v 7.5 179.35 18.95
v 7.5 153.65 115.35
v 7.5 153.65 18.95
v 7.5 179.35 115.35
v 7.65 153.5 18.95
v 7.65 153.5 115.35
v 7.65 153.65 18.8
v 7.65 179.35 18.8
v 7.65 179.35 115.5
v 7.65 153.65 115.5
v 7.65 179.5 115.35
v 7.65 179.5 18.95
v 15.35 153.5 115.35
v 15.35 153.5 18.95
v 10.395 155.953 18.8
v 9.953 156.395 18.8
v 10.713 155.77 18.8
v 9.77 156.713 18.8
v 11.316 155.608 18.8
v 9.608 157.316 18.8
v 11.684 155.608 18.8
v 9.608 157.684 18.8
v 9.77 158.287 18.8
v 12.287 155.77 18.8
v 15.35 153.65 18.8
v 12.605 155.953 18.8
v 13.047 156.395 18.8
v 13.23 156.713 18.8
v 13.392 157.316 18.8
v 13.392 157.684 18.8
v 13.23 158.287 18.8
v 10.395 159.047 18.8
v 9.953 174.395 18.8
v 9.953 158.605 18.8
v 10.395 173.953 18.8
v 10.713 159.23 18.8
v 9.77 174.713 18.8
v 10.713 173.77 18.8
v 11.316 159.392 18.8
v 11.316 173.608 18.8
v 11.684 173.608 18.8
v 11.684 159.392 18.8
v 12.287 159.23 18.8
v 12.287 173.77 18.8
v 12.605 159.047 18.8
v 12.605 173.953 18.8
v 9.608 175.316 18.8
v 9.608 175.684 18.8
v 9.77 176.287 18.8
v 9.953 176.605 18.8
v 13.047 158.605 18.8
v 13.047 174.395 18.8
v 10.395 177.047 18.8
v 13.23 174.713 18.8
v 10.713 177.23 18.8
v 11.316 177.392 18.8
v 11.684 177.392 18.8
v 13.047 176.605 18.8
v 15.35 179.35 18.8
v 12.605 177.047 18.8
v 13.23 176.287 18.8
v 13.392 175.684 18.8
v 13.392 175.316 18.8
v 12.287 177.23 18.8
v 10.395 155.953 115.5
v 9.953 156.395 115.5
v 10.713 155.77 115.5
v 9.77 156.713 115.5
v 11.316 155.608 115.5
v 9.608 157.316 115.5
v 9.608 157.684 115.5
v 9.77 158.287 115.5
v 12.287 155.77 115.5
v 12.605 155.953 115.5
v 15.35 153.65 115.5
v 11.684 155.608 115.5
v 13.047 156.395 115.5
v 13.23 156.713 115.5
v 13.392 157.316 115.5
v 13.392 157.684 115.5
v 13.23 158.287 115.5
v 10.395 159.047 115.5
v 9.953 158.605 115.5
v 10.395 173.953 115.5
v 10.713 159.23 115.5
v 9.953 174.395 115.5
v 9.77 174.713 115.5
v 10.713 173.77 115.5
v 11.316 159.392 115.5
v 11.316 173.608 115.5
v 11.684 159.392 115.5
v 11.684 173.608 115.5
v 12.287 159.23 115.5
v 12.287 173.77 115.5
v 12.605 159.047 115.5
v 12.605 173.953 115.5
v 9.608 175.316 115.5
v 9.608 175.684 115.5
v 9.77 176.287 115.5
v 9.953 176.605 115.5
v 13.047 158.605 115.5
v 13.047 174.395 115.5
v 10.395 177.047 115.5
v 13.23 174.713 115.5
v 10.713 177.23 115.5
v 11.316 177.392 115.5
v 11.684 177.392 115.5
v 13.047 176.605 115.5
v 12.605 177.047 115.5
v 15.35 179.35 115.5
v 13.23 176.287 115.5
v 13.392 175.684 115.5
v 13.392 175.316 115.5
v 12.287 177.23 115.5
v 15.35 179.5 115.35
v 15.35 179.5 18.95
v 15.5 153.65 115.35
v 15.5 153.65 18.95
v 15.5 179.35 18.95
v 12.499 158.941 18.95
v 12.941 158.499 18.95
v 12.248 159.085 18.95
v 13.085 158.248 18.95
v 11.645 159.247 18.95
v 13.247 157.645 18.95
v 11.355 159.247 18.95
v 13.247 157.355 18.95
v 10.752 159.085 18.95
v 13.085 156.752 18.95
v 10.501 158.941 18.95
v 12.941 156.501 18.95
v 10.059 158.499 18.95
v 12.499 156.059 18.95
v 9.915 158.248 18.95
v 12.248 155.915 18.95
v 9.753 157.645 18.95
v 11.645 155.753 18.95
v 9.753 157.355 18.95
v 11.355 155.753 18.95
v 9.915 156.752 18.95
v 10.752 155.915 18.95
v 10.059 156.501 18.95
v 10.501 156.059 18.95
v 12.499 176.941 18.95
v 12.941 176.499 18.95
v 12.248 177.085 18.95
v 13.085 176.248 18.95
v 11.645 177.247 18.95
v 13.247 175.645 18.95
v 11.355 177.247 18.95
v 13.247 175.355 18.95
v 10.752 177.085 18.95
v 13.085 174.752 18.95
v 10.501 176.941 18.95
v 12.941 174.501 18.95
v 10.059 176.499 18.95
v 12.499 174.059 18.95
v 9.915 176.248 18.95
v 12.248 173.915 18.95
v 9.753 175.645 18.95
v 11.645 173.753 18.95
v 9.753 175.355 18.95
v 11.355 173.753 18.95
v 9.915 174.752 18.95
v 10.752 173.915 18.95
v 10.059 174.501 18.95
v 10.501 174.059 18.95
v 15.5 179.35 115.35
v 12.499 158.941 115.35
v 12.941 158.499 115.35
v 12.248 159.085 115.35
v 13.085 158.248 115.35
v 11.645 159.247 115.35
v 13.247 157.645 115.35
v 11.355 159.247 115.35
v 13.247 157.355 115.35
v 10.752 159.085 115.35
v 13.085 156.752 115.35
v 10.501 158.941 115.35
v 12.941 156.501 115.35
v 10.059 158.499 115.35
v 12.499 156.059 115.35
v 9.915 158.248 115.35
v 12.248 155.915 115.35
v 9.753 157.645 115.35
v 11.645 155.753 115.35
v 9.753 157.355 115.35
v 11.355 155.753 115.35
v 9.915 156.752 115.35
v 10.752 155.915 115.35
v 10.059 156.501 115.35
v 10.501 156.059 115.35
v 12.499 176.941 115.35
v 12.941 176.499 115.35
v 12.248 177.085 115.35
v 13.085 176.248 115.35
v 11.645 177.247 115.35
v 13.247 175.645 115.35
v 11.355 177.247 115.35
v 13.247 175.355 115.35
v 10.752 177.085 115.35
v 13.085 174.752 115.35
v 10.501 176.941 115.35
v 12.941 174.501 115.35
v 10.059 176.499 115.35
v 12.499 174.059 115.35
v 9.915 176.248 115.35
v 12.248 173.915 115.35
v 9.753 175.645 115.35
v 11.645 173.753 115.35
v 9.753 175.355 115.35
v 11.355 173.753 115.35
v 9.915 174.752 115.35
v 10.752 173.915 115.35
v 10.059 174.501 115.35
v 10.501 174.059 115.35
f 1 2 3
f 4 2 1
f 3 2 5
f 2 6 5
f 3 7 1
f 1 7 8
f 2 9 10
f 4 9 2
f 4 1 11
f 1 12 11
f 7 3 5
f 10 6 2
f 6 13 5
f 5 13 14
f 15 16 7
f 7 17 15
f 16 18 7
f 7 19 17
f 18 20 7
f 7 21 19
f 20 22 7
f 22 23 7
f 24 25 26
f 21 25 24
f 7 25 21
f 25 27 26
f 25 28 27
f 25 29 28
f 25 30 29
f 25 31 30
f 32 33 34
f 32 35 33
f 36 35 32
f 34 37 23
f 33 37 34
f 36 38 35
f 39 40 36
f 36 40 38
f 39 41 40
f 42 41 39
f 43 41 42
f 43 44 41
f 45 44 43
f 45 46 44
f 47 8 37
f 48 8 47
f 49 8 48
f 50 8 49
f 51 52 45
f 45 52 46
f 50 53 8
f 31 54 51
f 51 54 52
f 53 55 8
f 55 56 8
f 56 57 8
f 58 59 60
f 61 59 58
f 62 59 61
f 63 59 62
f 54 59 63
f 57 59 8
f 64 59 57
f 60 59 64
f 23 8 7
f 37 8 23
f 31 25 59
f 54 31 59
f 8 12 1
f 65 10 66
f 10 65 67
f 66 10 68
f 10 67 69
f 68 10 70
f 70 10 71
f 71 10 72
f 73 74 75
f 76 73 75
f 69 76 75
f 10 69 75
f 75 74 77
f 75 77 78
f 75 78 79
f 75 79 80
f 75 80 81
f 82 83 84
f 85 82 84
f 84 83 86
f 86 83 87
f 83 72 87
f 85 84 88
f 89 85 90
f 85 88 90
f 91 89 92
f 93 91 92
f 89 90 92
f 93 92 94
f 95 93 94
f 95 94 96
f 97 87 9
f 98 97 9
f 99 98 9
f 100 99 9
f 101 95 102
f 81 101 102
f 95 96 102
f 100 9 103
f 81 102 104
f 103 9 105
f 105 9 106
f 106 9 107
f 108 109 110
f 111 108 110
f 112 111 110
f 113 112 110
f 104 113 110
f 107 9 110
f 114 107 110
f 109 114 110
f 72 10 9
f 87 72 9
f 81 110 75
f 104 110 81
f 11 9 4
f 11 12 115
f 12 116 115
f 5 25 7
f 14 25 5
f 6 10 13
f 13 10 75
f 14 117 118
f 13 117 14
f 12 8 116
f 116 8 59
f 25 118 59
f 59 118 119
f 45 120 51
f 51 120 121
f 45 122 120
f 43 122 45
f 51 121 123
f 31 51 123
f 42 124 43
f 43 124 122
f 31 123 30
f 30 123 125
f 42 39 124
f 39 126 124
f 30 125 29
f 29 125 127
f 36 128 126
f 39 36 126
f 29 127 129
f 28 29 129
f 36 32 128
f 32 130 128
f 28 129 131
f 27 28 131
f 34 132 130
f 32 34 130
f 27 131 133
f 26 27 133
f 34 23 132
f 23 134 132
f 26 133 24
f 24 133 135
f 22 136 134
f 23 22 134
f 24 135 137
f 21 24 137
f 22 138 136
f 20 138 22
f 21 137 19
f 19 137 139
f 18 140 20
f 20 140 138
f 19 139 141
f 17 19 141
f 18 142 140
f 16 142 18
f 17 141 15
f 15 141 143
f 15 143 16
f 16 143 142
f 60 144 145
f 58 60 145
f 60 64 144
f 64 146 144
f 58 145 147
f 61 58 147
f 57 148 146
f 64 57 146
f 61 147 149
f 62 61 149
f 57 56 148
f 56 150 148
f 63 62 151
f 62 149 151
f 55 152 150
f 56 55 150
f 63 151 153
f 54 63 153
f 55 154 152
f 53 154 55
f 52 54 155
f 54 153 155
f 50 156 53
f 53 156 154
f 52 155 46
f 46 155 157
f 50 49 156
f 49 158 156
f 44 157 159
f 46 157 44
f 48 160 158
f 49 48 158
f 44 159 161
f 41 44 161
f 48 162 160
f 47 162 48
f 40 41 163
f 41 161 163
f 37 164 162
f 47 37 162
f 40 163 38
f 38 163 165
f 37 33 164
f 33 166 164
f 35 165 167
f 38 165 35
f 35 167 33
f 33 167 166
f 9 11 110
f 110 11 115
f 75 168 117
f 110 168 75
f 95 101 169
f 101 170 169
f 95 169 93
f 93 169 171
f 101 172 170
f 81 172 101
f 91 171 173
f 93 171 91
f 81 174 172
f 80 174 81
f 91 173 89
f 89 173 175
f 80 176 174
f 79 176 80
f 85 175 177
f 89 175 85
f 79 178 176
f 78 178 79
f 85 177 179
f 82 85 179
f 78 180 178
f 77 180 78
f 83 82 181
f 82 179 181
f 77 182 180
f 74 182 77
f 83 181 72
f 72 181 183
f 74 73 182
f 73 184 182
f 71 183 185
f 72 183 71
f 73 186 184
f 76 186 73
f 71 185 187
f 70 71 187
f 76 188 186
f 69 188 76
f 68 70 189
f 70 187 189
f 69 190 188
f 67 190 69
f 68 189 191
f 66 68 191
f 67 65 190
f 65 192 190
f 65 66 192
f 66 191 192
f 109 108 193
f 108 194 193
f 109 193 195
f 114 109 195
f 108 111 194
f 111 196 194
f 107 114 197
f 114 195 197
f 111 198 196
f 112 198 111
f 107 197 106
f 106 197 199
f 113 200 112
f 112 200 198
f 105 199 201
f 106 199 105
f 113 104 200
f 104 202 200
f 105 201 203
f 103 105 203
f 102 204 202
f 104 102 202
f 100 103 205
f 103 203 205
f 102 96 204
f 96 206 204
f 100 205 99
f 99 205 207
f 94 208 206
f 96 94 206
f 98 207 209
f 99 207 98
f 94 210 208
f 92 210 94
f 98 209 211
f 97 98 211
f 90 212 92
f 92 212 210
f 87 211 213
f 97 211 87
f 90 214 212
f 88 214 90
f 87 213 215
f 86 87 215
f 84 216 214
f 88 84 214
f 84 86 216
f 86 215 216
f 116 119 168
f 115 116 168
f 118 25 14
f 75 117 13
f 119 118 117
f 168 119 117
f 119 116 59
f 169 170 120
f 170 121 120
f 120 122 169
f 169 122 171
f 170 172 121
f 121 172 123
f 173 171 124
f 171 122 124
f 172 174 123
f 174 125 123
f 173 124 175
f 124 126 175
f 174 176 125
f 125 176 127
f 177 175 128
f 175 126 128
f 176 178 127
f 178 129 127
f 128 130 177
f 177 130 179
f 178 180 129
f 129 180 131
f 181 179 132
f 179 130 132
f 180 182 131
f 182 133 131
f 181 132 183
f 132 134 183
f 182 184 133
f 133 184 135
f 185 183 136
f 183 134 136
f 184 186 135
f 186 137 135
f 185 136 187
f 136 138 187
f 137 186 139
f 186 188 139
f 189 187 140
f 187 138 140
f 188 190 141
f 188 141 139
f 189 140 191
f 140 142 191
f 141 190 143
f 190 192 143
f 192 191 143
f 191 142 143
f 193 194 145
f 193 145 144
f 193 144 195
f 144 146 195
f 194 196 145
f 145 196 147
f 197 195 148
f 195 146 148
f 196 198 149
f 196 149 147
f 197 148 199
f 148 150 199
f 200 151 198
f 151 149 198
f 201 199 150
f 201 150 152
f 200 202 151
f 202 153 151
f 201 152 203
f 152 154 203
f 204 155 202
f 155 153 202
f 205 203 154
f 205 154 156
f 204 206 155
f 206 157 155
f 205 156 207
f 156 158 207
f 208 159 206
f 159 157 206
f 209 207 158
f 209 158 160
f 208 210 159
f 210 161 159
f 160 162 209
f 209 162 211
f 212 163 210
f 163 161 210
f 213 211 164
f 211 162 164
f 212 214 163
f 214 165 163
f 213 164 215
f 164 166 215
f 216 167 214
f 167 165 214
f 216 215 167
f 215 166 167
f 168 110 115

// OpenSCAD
// Generated from the same CSG operations as STEP. Rebuild with spec/build_parent_hand_service.py.
polyhedron(points=[[7.5, 153.64999389648438, 18.950000762939453], [7.5, 153.64999389648438, 115.3499984741211], [7.5, 179.35000610351562, 18.950000762939453], [7.5, 179.35000610351562, 115.3499984741211], [7.650000095367432, 153.5, 18.950000762939453], [7.650000095367432, 153.5, 115.3499984741211], [7.650000095367432, 153.64999389648438, 18.799999237060547], [7.650000095367432, 179.35000610351562, 18.799999237060547], [7.650000095367432, 153.64999389648438, 115.5], [7.650000095367432, 179.35000610351562, 115.5], [7.650000095367432, 179.5, 115.3499984741211], [7.650000095367432, 179.5, 18.950000762939453], [15.350000381469727, 153.5, 115.3499984741211], [15.350000381469727, 153.5, 18.950000762939453], [9.953407287597656, 156.3949432373047, 18.799999237060547], [10.394942283630371, 155.9534149169922, 18.799999237060547], [10.713140487670898, 155.7696990966797, 18.799999237060547], [9.769695281982422, 156.713134765625, 18.799999237060547], [11.316287994384766, 155.6080780029297, 18.799999237060547], [9.60808277130127, 157.3162841796875, 18.799999237060547], [11.683712005615234, 155.6080780029297, 18.799999237060547], [9.60808277130127, 157.6837158203125, 18.799999237060547], [9.769695281982422, 158.286865234375, 18.799999237060547], [12.605057716369629, 155.9534149169922, 18.799999237060547], [15.350000381469727, 153.64999389648438, 18.799999237060547], [12.286859512329102, 155.7696990966797, 18.799999237060547], [13.046592712402344, 156.3949432373047, 18.799999237060547], [13.230304718017578, 156.713134765625, 18.799999237060547], [13.39191722869873, 157.3162841796875, 18.799999237060547], [13.39191722869873, 157.6837158203125, 18.799999237060547], [13.230304718017578, 158.286865234375, 18.799999237060547], [9.953407287597656, 158.6050567626953, 18.799999237060547], [9.953407287597656, 174.3949432373047, 18.799999237060547], [10.394942283630371, 159.0465850830078, 18.799999237060547], [10.394942283630371, 173.9534149169922, 18.799999237060547], [10.713140487670898, 159.2303009033203, 18.799999237060547], [9.769695281982422, 174.713134765625, 18.799999237060547], [10.713140487670898, 173.7696990966797, 18.799999237060547], [11.316287994384766, 173.6080780029297, 18.799999237060547], [11.316287994384766, 159.3919219970703, 18.799999237060547], [11.683712005615234, 173.6080780029297, 18.799999237060547], [11.683712005615234, 159.3919219970703, 18.799999237060547], [12.286859512329102, 159.2303009033203, 18.799999237060547], [12.286859512329102, 173.7696990966797, 18.799999237060547], [12.605057716369629, 159.0465850830078, 18.799999237060547], [12.605057716369629, 173.9534149169922, 18.799999237060547], [9.60808277130127, 175.3162841796875, 18.799999237060547], [9.60808277130127, 175.6837158203125, 18.799999237060547], [9.769695281982422, 176.286865234375, 18.799999237060547], [9.953407287597656, 176.6050567626953, 18.799999237060547], [13.046592712402344, 174.3949432373047, 18.799999237060547], [13.046592712402344, 158.6050567626953, 18.799999237060547], [10.394942283630371, 177.0465850830078, 18.799999237060547], [13.230304718017578, 174.713134765625, 18.799999237060547], [10.713140487670898, 177.2303009033203, 18.799999237060547], [11.316287994384766, 177.3919219970703, 18.799999237060547], [11.683712005615234, 177.3919219970703, 18.799999237060547], [12.605057716369629, 177.0465850830078, 18.799999237060547], [15.350000381469727, 179.35000610351562, 18.799999237060547], [13.046592712402344, 176.6050567626953, 18.799999237060547], [13.230304718017578, 176.286865234375, 18.799999237060547], [13.39191722869873, 175.6837158203125, 18.799999237060547], [13.39191722869873, 175.3162841796875, 18.799999237060547], [12.286859512329102, 177.2303009033203, 18.799999237060547], [9.953407287597656, 156.3949432373047, 115.5], [10.394942283630371, 155.9534149169922, 115.5], [10.713140487670898, 155.7696990966797, 115.5], [9.769695281982422, 156.713134765625, 115.5], [11.316287994384766, 155.6080780029297, 115.5], [9.60808277130127, 157.3162841796875, 115.5], [9.60808277130127, 157.6837158203125, 115.5], [9.769695281982422, 158.286865234375, 115.5], [15.350000381469727, 153.64999389648438, 115.5], [12.605057716369629, 155.9534149169922, 115.5], [12.286859512329102, 155.7696990966797, 115.5], [11.683712005615234, 155.6080780029297, 115.5], [13.046592712402344, 156.3949432373047, 115.5], [13.230304718017578, 156.713134765625, 115.5], [13.39191722869873, 157.3162841796875, 115.5], [13.39191722869873, 157.6837158203125, 115.5], [13.230304718017578, 158.286865234375, 115.5], [10.394942283630371, 173.9534149169922, 115.5], [9.953407287597656, 158.6050567626953, 115.5], [10.394942283630371, 159.0465850830078, 115.5], [10.713140487670898, 159.2303009033203, 115.5], [9.953407287597656, 174.3949432373047, 115.5], [9.769695281982422, 174.713134765625, 115.5], [10.713140487670898, 173.7696990966797, 115.5], [11.316287994384766, 173.6080780029297, 115.5], [11.316287994384766, 159.3919219970703, 115.5], [11.683712005615234, 173.6080780029297, 115.5], [11.683712005615234, 159.3919219970703, 115.5], [12.286859512329102, 159.2303009033203, 115.5], [12.286859512329102, 173.7696990966797, 115.5], [12.605057716369629, 159.0465850830078, 115.5], [12.605057716369629, 173.9534149169922, 115.5], [9.60808277130127, 175.3162841796875, 115.5], [9.60808277130127, 175.6837158203125, 115.5], [9.769695281982422, 176.286865234375, 115.5], [9.953407287597656, 176.6050567626953, 115.5], [13.046592712402344, 174.3949432373047, 115.5], [13.046592712402344, 158.6050567626953, 115.5], [10.394942283630371, 177.0465850830078, 115.5], [13.230304718017578, 174.713134765625, 115.5], [10.713140487670898, 177.2303009033203, 115.5], [11.316287994384766, 177.3919219970703, 115.5], [11.683712005615234, 177.3919219970703, 115.5], [15.350000381469727, 179.35000610351562, 115.5], [12.605057716369629, 177.0465850830078, 115.5], [13.046592712402344, 176.6050567626953, 115.5], [13.230304718017578, 176.286865234375, 115.5], [13.39191722869873, 175.6837158203125, 115.5], [13.39191722869873, 175.3162841796875, 115.5], [12.286859512329102, 177.2303009033203, 115.5], [15.350000381469727, 179.5, 115.3499984741211], [15.350000381469727, 179.5, 18.950000762939453], [15.5, 153.64999389648438, 18.950000762939453], [15.5, 153.64999389648438, 115.3499984741211], [15.5, 179.35000610351562, 18.950000762939453], [12.498991966247559, 158.94052124023438, 18.950000762939453], [12.940526962280273, 158.49899291992188, 18.950000762939453], [12.24803638458252, 159.08541870117188, 18.950000762939453], [13.085415840148926, 158.24803161621094, 18.950000762939453], [11.644888877868652, 159.2470245361328, 18.950000762939453], [13.247028350830078, 157.64488220214844, 18.950000762939453], [11.355111122131348, 159.2470245361328, 18.950000762939453], [13.247028350830078, 157.35511779785156, 18.950000762939453], [10.75196361541748, 159.08541870117188, 18.950000762939453], [13.085415840148926, 156.75196838378906, 18.950000762939453], [10.501008033752441, 158.94052124023438, 18.950000762939453], [12.940526962280273, 156.50100708007812, 18.950000762939453], [10.059473037719727, 158.49899291992188, 18.950000762939453], [12.498991966247559, 156.05947875976562, 18.950000762939453], [9.914584159851074, 158.24803161621094, 18.950000762939453], [12.24803638458252, 155.91458129882812, 18.950000762939453], [9.752971649169922, 157.64488220214844, 18.950000762939453], [11.644888877868652, 155.7529754638672, 18.950000762939453], [9.752971649169922, 157.35511779785156, 18.950000762939453], [11.355111122131348, 155.7529754638672, 18.950000762939453], [9.914584159851074, 156.75196838378906, 18.950000762939453], [10.75196361541748, 155.91458129882812, 18.950000762939453], [10.059473037719727, 156.50100708007812, 18.950000762939453], [10.501008033752441, 156.05947875976562, 18.950000762939453], [12.940526962280273, 176.49899291992188, 18.950000762939453], [12.498991966247559, 176.94052124023438, 18.950000762939453], [12.24803638458252, 177.08541870117188, 18.950000762939453], [13.085415840148926, 176.24803161621094, 18.950000762939453], [11.644888877868652, 177.2470245361328, 18.950000762939453], [13.247028350830078, 175.64488220214844, 18.950000762939453], [11.355111122131348, 177.2470245361328, 18.950000762939453], [13.247028350830078, 175.35511779785156, 18.950000762939453], [10.75196361541748, 177.08541870117188, 18.950000762939453], [13.085415840148926, 174.75196838378906, 18.950000762939453], [10.501008033752441, 176.94052124023438, 18.950000762939453], [12.940526962280273, 174.50100708007812, 18.950000762939453], [10.059473037719727, 176.49899291992188, 18.950000762939453], [12.498991966247559, 174.05947875976562, 18.950000762939453], [9.914584159851074, 176.24803161621094, 18.950000762939453], [12.24803638458252, 173.91458129882812, 18.950000762939453], [9.752971649169922, 175.64488220214844, 18.950000762939453], [11.644888877868652, 173.7529754638672, 18.950000762939453], [9.752971649169922, 175.35511779785156, 18.950000762939453], [11.355111122131348, 173.7529754638672, 18.950000762939453], [9.914584159851074, 174.75196838378906, 18.950000762939453], [10.75196361541748, 173.91458129882812, 18.950000762939453], [10.059473037719727, 174.50100708007812, 18.950000762939453], [10.501008033752441, 174.05947875976562, 18.950000762939453], [15.5, 179.35000610351562, 115.3499984741211], [12.498991966247559, 158.94052124023438, 115.3499984741211], [12.940526962280273, 158.49899291992188, 115.3499984741211], [12.24803638458252, 159.08541870117188, 115.3499984741211], [13.085415840148926, 158.24803161621094, 115.3499984741211], [11.644888877868652, 159.2470245361328, 115.3499984741211], [13.247028350830078, 157.64488220214844, 115.3499984741211], [11.355111122131348, 159.2470245361328, 115.3499984741211], [13.247028350830078, 157.35511779785156, 115.3499984741211], [10.75196361541748, 159.08541870117188, 115.3499984741211], [13.085415840148926, 156.75196838378906, 115.3499984741211], [10.501008033752441, 158.94052124023438, 115.3499984741211], [12.940526962280273, 156.50100708007812, 115.3499984741211], [10.059473037719727, 158.49899291992188, 115.3499984741211], [12.498991966247559, 156.05947875976562, 115.3499984741211], [9.914584159851074, 158.24803161621094, 115.3499984741211], [12.24803638458252, 155.91458129882812, 115.3499984741211], [9.752971649169922, 157.64488220214844, 115.3499984741211], [11.644888877868652, 155.7529754638672, 115.3499984741211], [9.752971649169922, 157.35511779785156, 115.3499984741211], [11.355111122131348, 155.7529754638672, 115.3499984741211], [9.914584159851074, 156.75196838378906, 115.3499984741211], [10.75196361541748, 155.91458129882812, 115.3499984741211], [10.059473037719727, 156.50100708007812, 115.3499984741211], [10.501008033752441, 156.05947875976562, 115.3499984741211], [12.498991966247559, 176.94052124023438, 115.3499984741211], [12.940526962280273, 176.49899291992188, 115.3499984741211], [12.24803638458252, 177.08541870117188, 115.3499984741211], [13.085415840148926, 176.24803161621094, 115.3499984741211], [11.644888877868652, 177.2470245361328, 115.3499984741211], [13.247028350830078, 175.64488220214844, 115.3499984741211], [11.355111122131348, 177.2470245361328, 115.3499984741211], [13.247028350830078, 175.35511779785156, 115.3499984741211], [10.75196361541748, 177.08541870117188, 115.3499984741211], [13.085415840148926, 174.75196838378906, 115.3499984741211], [10.501008033752441, 176.94052124023438, 115.3499984741211], [12.940526962280273, 174.50100708007812, 115.3499984741211], [10.059473037719727, 176.49899291992188, 115.3499984741211], [12.498991966247559, 174.05947875976562, 115.3499984741211], [9.914584159851074, 176.24803161621094, 115.3499984741211], [12.24803638458252, 173.91458129882812, 115.3499984741211], [9.752971649169922, 175.64488220214844, 115.3499984741211], [11.644888877868652, 173.7529754638672, 115.3499984741211], [9.752971649169922, 175.35511779785156, 115.3499984741211], [11.355111122131348, 173.7529754638672, 115.3499984741211], [9.914584159851074, 174.75196838378906, 115.3499984741211], [10.75196361541748, 173.91458129882812, 115.3499984741211], [10.059473037719727, 174.50100708007812, 115.3499984741211], [10.501008033752441, 174.05947875976562, 115.3499984741211]],faces=[[0, 1, 2], [2, 1, 3], [4, 1, 0], [4, 5, 1], [2, 6, 0], [7, 6, 2], [8, 9, 1], [1, 9, 3], [10, 2, 3], [10, 11, 2], [4, 0, 6], [1, 5, 8], [4, 12, 5], [13, 12, 4], [6, 14, 15], [15, 16, 6], [6, 17, 14], [16, 18, 6], [6, 19, 17], [18, 20, 6], [6, 21, 19], [6, 22, 21], [23, 24, 25], [25, 24, 20], [20, 24, 6], [23, 26, 24], [26, 27, 24], [27, 28, 24], [28, 29, 24], [29, 30, 24], [31, 32, 33], [32, 34, 33], [33, 34, 35], [22, 36, 31], [31, 36, 32], [34, 37, 35], [35, 38, 39], [37, 38, 35], [38, 40, 39], [39, 40, 41], [41, 40, 42], [40, 43, 42], [42, 43, 44], [43, 45, 44], [36, 7, 46], [46, 7, 47], [47, 7, 48], [48, 7, 49], [44, 50, 51], [45, 50, 44], [7, 52, 49], [51, 53, 30], [50, 53, 51], [7, 54, 52], [7, 55, 54], [7, 56, 55], [57, 58, 59], [59, 58, 60], [60, 58, 61], [61, 58, 62], [62, 58, 53], [7, 58, 56], [56, 58, 63], [63, 58, 57], [6, 7, 22], [22, 7, 36], [58, 24, 30], [58, 30, 53], [2, 11, 7], [64, 8, 65], [66, 65, 8], [67, 8, 64], [68, 66, 8], [69, 8, 67], [70, 8, 69], [71, 8, 70], [72, 73, 74], [72, 74, 75], [72, 75, 68], [72, 68, 8], [76, 73, 72], [77, 76, 72], [78, 77, 72], [79, 78, 72], [80, 79, 72], [81, 82, 83], [81, 83, 84], [85, 82, 81], [86, 82, 85], [86, 71, 82], [87, 81, 84], [88, 84, 89], [88, 87, 84], [90, 89, 91], [90, 91, 92], [90, 88, 89], [93, 90, 92], [93, 92, 94], [95, 93, 94], [9, 86, 96], [9, 96, 97], [9, 97, 98], [9, 98, 99], [100, 94, 101], [100, 101, 80], [100, 95, 94], [102, 9, 99], [103, 100, 80], [104, 9, 102], [105, 9, 104], [106, 9, 105], [107, 108, 109], [107, 109, 110], [107, 110, 111], [107, 111, 112], [107, 112, 103], [107, 9, 106], [107, 106, 113], [107, 113, 108], [9, 8, 71], [9, 71, 86], [72, 107, 80], [80, 107, 103], [3, 9, 10], [114, 11, 10], [114, 115, 11], [6, 24, 4], [4, 24, 13], [12, 8, 5], [72, 8, 12], [116, 117, 13], [13, 117, 12], [115, 7, 11], [58, 7, 115], [58, 116, 24], [118, 116, 58], [51, 119, 44], [120, 119, 51], [119, 121, 44], [44, 121, 42], [122, 120, 51], [122, 51, 30], [42, 123, 41], [121, 123, 42], [29, 122, 30], [124, 122, 29], [123, 39, 41], [123, 125, 39], [28, 124, 29], [126, 124, 28], [125, 127, 35], [125, 35, 39], [128, 126, 28], [128, 28, 27], [127, 33, 35], [127, 129, 33], [130, 128, 27], [130, 27, 26], [129, 131, 31], [129, 31, 33], [132, 130, 26], [132, 26, 23], [131, 22, 31], [131, 133, 22], [25, 132, 23], [134, 132, 25], [133, 135, 21], [133, 21, 22], [136, 134, 25], [136, 25, 20], [135, 137, 21], [21, 137, 19], [18, 136, 20], [138, 136, 18], [19, 139, 17], [137, 139, 19], [140, 138, 18], [140, 18, 16], [139, 141, 17], [17, 141, 14], [15, 140, 16], [142, 140, 15], [14, 142, 15], [141, 142, 14], [143, 144, 57], [143, 57, 59], [144, 63, 57], [144, 145, 63], [146, 143, 59], [146, 59, 60], [145, 147, 56], [145, 56, 63], [148, 146, 60], [148, 60, 61], [147, 55, 56], [147, 149, 55], [150, 61, 62], [150, 148, 61], [149, 151, 54], [149, 54, 55], [152, 150, 62], [152, 62, 53], [151, 153, 54], [54, 153, 52], [154, 53, 50], [154, 152, 53], [52, 155, 49], [153, 155, 52], [45, 154, 50], [156, 154, 45], [155, 48, 49], [155, 157, 48], [158, 156, 43], [43, 156, 45], [157, 159, 47], [157, 47, 48], [160, 158, 43], [160, 43, 40], [159, 161, 47], [47, 161, 46], [162, 40, 38], [162, 160, 40], [161, 163, 36], [161, 36, 46], [37, 162, 38], [164, 162, 37], [163, 32, 36], [163, 165, 32], [166, 164, 34], [34, 164, 37], [32, 166, 34], [165, 166, 32], [107, 10, 9], [114, 10, 107], [117, 167, 72], [72, 167, 107], [168, 101, 94], [168, 169, 101], [92, 168, 94], [170, 168, 92], [169, 171, 101], [101, 171, 80], [172, 170, 91], [91, 170, 92], [171, 173, 80], [80, 173, 79], [89, 172, 91], [174, 172, 89], [173, 175, 79], [79, 175, 78], [176, 174, 84], [84, 174, 89], [175, 177, 78], [78, 177, 77], [178, 176, 84], [178, 84, 83], [177, 179, 77], [77, 179, 76], [180, 83, 82], [180, 178, 83], [179, 181, 76], [76, 181, 73], [71, 180, 82], [182, 180, 71], [181, 74, 73], [181, 183, 74], [184, 182, 70], [70, 182, 71], [183, 185, 74], [74, 185, 75], [186, 184, 70], [186, 70, 69], [185, 187, 75], [75, 187, 68], [188, 69, 67], [188, 186, 69], [187, 189, 68], [68, 189, 66], [190, 188, 67], [190, 67, 64], [189, 65, 66], [189, 191, 65], [191, 64, 65], [191, 190, 64], [192, 109, 108], [192, 193, 109], [194, 192, 108], [194, 108, 113], [193, 110, 109], [193, 195, 110], [196, 113, 106], [196, 194, 113], [195, 197, 110], [110, 197, 111], [105, 196, 106], [198, 196, 105], [111, 199, 112], [197, 199, 111], [200, 198, 104], [104, 198, 105], [199, 103, 112], [199, 201, 103], [202, 200, 104], [202, 104, 102], [201, 203, 100], [201, 100, 103], [204, 102, 99], [204, 202, 102], [203, 95, 100], [203, 205, 95], [98, 204, 99], [206, 204, 98], [205, 207, 93], [205, 93, 95], [208, 206, 97], [97, 206, 98], [207, 209, 93], [93, 209, 90], [210, 208, 97], [210, 97, 96], [90, 211, 88], [209, 211, 90], [212, 210, 86], [86, 210, 96], [211, 213, 88], [88, 213, 87], [214, 212, 86], [214, 86, 85], [213, 215, 81], [213, 81, 87], [215, 85, 81], [215, 214, 85], [167, 118, 115], [167, 115, 114], [13, 24, 116], [12, 117, 72], [117, 116, 118], [117, 118, 167], [58, 115, 118], [119, 169, 168], [119, 120, 169], [168, 121, 119], [170, 121, 168], [120, 171, 169], [122, 171, 120], [123, 170, 172], [123, 121, 170], [122, 173, 171], [122, 124, 173], [174, 123, 172], [174, 125, 123], [124, 175, 173], [126, 175, 124], [127, 174, 176], [127, 125, 174], [126, 177, 175], [126, 128, 177], [176, 129, 127], [178, 129, 176], [128, 179, 177], [130, 179, 128], [131, 178, 180], [131, 129, 178], [130, 181, 179], [130, 132, 181], [182, 131, 180], [182, 133, 131], [132, 183, 181], [134, 183, 132], [135, 182, 184], [135, 133, 182], [134, 185, 183], [134, 136, 185], [186, 135, 184], [186, 137, 135], [138, 185, 136], [138, 187, 185], [139, 186, 188], [139, 137, 186], [140, 189, 187], [138, 140, 187], [190, 139, 188], [190, 141, 139], [142, 189, 140], [142, 191, 189], [142, 190, 191], [142, 141, 190], [143, 193, 192], [144, 143, 192], [194, 144, 192], [194, 145, 144], [143, 195, 193], [146, 195, 143], [147, 194, 196], [147, 145, 194], [148, 197, 195], [146, 148, 195], [198, 147, 196], [198, 149, 147], [197, 150, 199], [197, 148, 150], [149, 198, 200], [151, 149, 200], [150, 201, 199], [150, 152, 201], [202, 151, 200], [202, 153, 151], [201, 154, 203], [201, 152, 154], [153, 202, 204], [155, 153, 204], [154, 205, 203], [154, 156, 205], [206, 155, 204], [206, 157, 155], [205, 158, 207], [205, 156, 158], [157, 206, 208], [159, 157, 208], [158, 209, 207], [158, 160, 209], [208, 161, 159], [210, 161, 208], [209, 162, 211], [209, 160, 162], [163, 210, 212], [163, 161, 210], [162, 213, 211], [162, 164, 213], [214, 163, 212], [214, 165, 163], [213, 166, 215], [213, 164, 166], [166, 214, 215], [166, 165, 214], [114, 107, 167]],convexity=10);
